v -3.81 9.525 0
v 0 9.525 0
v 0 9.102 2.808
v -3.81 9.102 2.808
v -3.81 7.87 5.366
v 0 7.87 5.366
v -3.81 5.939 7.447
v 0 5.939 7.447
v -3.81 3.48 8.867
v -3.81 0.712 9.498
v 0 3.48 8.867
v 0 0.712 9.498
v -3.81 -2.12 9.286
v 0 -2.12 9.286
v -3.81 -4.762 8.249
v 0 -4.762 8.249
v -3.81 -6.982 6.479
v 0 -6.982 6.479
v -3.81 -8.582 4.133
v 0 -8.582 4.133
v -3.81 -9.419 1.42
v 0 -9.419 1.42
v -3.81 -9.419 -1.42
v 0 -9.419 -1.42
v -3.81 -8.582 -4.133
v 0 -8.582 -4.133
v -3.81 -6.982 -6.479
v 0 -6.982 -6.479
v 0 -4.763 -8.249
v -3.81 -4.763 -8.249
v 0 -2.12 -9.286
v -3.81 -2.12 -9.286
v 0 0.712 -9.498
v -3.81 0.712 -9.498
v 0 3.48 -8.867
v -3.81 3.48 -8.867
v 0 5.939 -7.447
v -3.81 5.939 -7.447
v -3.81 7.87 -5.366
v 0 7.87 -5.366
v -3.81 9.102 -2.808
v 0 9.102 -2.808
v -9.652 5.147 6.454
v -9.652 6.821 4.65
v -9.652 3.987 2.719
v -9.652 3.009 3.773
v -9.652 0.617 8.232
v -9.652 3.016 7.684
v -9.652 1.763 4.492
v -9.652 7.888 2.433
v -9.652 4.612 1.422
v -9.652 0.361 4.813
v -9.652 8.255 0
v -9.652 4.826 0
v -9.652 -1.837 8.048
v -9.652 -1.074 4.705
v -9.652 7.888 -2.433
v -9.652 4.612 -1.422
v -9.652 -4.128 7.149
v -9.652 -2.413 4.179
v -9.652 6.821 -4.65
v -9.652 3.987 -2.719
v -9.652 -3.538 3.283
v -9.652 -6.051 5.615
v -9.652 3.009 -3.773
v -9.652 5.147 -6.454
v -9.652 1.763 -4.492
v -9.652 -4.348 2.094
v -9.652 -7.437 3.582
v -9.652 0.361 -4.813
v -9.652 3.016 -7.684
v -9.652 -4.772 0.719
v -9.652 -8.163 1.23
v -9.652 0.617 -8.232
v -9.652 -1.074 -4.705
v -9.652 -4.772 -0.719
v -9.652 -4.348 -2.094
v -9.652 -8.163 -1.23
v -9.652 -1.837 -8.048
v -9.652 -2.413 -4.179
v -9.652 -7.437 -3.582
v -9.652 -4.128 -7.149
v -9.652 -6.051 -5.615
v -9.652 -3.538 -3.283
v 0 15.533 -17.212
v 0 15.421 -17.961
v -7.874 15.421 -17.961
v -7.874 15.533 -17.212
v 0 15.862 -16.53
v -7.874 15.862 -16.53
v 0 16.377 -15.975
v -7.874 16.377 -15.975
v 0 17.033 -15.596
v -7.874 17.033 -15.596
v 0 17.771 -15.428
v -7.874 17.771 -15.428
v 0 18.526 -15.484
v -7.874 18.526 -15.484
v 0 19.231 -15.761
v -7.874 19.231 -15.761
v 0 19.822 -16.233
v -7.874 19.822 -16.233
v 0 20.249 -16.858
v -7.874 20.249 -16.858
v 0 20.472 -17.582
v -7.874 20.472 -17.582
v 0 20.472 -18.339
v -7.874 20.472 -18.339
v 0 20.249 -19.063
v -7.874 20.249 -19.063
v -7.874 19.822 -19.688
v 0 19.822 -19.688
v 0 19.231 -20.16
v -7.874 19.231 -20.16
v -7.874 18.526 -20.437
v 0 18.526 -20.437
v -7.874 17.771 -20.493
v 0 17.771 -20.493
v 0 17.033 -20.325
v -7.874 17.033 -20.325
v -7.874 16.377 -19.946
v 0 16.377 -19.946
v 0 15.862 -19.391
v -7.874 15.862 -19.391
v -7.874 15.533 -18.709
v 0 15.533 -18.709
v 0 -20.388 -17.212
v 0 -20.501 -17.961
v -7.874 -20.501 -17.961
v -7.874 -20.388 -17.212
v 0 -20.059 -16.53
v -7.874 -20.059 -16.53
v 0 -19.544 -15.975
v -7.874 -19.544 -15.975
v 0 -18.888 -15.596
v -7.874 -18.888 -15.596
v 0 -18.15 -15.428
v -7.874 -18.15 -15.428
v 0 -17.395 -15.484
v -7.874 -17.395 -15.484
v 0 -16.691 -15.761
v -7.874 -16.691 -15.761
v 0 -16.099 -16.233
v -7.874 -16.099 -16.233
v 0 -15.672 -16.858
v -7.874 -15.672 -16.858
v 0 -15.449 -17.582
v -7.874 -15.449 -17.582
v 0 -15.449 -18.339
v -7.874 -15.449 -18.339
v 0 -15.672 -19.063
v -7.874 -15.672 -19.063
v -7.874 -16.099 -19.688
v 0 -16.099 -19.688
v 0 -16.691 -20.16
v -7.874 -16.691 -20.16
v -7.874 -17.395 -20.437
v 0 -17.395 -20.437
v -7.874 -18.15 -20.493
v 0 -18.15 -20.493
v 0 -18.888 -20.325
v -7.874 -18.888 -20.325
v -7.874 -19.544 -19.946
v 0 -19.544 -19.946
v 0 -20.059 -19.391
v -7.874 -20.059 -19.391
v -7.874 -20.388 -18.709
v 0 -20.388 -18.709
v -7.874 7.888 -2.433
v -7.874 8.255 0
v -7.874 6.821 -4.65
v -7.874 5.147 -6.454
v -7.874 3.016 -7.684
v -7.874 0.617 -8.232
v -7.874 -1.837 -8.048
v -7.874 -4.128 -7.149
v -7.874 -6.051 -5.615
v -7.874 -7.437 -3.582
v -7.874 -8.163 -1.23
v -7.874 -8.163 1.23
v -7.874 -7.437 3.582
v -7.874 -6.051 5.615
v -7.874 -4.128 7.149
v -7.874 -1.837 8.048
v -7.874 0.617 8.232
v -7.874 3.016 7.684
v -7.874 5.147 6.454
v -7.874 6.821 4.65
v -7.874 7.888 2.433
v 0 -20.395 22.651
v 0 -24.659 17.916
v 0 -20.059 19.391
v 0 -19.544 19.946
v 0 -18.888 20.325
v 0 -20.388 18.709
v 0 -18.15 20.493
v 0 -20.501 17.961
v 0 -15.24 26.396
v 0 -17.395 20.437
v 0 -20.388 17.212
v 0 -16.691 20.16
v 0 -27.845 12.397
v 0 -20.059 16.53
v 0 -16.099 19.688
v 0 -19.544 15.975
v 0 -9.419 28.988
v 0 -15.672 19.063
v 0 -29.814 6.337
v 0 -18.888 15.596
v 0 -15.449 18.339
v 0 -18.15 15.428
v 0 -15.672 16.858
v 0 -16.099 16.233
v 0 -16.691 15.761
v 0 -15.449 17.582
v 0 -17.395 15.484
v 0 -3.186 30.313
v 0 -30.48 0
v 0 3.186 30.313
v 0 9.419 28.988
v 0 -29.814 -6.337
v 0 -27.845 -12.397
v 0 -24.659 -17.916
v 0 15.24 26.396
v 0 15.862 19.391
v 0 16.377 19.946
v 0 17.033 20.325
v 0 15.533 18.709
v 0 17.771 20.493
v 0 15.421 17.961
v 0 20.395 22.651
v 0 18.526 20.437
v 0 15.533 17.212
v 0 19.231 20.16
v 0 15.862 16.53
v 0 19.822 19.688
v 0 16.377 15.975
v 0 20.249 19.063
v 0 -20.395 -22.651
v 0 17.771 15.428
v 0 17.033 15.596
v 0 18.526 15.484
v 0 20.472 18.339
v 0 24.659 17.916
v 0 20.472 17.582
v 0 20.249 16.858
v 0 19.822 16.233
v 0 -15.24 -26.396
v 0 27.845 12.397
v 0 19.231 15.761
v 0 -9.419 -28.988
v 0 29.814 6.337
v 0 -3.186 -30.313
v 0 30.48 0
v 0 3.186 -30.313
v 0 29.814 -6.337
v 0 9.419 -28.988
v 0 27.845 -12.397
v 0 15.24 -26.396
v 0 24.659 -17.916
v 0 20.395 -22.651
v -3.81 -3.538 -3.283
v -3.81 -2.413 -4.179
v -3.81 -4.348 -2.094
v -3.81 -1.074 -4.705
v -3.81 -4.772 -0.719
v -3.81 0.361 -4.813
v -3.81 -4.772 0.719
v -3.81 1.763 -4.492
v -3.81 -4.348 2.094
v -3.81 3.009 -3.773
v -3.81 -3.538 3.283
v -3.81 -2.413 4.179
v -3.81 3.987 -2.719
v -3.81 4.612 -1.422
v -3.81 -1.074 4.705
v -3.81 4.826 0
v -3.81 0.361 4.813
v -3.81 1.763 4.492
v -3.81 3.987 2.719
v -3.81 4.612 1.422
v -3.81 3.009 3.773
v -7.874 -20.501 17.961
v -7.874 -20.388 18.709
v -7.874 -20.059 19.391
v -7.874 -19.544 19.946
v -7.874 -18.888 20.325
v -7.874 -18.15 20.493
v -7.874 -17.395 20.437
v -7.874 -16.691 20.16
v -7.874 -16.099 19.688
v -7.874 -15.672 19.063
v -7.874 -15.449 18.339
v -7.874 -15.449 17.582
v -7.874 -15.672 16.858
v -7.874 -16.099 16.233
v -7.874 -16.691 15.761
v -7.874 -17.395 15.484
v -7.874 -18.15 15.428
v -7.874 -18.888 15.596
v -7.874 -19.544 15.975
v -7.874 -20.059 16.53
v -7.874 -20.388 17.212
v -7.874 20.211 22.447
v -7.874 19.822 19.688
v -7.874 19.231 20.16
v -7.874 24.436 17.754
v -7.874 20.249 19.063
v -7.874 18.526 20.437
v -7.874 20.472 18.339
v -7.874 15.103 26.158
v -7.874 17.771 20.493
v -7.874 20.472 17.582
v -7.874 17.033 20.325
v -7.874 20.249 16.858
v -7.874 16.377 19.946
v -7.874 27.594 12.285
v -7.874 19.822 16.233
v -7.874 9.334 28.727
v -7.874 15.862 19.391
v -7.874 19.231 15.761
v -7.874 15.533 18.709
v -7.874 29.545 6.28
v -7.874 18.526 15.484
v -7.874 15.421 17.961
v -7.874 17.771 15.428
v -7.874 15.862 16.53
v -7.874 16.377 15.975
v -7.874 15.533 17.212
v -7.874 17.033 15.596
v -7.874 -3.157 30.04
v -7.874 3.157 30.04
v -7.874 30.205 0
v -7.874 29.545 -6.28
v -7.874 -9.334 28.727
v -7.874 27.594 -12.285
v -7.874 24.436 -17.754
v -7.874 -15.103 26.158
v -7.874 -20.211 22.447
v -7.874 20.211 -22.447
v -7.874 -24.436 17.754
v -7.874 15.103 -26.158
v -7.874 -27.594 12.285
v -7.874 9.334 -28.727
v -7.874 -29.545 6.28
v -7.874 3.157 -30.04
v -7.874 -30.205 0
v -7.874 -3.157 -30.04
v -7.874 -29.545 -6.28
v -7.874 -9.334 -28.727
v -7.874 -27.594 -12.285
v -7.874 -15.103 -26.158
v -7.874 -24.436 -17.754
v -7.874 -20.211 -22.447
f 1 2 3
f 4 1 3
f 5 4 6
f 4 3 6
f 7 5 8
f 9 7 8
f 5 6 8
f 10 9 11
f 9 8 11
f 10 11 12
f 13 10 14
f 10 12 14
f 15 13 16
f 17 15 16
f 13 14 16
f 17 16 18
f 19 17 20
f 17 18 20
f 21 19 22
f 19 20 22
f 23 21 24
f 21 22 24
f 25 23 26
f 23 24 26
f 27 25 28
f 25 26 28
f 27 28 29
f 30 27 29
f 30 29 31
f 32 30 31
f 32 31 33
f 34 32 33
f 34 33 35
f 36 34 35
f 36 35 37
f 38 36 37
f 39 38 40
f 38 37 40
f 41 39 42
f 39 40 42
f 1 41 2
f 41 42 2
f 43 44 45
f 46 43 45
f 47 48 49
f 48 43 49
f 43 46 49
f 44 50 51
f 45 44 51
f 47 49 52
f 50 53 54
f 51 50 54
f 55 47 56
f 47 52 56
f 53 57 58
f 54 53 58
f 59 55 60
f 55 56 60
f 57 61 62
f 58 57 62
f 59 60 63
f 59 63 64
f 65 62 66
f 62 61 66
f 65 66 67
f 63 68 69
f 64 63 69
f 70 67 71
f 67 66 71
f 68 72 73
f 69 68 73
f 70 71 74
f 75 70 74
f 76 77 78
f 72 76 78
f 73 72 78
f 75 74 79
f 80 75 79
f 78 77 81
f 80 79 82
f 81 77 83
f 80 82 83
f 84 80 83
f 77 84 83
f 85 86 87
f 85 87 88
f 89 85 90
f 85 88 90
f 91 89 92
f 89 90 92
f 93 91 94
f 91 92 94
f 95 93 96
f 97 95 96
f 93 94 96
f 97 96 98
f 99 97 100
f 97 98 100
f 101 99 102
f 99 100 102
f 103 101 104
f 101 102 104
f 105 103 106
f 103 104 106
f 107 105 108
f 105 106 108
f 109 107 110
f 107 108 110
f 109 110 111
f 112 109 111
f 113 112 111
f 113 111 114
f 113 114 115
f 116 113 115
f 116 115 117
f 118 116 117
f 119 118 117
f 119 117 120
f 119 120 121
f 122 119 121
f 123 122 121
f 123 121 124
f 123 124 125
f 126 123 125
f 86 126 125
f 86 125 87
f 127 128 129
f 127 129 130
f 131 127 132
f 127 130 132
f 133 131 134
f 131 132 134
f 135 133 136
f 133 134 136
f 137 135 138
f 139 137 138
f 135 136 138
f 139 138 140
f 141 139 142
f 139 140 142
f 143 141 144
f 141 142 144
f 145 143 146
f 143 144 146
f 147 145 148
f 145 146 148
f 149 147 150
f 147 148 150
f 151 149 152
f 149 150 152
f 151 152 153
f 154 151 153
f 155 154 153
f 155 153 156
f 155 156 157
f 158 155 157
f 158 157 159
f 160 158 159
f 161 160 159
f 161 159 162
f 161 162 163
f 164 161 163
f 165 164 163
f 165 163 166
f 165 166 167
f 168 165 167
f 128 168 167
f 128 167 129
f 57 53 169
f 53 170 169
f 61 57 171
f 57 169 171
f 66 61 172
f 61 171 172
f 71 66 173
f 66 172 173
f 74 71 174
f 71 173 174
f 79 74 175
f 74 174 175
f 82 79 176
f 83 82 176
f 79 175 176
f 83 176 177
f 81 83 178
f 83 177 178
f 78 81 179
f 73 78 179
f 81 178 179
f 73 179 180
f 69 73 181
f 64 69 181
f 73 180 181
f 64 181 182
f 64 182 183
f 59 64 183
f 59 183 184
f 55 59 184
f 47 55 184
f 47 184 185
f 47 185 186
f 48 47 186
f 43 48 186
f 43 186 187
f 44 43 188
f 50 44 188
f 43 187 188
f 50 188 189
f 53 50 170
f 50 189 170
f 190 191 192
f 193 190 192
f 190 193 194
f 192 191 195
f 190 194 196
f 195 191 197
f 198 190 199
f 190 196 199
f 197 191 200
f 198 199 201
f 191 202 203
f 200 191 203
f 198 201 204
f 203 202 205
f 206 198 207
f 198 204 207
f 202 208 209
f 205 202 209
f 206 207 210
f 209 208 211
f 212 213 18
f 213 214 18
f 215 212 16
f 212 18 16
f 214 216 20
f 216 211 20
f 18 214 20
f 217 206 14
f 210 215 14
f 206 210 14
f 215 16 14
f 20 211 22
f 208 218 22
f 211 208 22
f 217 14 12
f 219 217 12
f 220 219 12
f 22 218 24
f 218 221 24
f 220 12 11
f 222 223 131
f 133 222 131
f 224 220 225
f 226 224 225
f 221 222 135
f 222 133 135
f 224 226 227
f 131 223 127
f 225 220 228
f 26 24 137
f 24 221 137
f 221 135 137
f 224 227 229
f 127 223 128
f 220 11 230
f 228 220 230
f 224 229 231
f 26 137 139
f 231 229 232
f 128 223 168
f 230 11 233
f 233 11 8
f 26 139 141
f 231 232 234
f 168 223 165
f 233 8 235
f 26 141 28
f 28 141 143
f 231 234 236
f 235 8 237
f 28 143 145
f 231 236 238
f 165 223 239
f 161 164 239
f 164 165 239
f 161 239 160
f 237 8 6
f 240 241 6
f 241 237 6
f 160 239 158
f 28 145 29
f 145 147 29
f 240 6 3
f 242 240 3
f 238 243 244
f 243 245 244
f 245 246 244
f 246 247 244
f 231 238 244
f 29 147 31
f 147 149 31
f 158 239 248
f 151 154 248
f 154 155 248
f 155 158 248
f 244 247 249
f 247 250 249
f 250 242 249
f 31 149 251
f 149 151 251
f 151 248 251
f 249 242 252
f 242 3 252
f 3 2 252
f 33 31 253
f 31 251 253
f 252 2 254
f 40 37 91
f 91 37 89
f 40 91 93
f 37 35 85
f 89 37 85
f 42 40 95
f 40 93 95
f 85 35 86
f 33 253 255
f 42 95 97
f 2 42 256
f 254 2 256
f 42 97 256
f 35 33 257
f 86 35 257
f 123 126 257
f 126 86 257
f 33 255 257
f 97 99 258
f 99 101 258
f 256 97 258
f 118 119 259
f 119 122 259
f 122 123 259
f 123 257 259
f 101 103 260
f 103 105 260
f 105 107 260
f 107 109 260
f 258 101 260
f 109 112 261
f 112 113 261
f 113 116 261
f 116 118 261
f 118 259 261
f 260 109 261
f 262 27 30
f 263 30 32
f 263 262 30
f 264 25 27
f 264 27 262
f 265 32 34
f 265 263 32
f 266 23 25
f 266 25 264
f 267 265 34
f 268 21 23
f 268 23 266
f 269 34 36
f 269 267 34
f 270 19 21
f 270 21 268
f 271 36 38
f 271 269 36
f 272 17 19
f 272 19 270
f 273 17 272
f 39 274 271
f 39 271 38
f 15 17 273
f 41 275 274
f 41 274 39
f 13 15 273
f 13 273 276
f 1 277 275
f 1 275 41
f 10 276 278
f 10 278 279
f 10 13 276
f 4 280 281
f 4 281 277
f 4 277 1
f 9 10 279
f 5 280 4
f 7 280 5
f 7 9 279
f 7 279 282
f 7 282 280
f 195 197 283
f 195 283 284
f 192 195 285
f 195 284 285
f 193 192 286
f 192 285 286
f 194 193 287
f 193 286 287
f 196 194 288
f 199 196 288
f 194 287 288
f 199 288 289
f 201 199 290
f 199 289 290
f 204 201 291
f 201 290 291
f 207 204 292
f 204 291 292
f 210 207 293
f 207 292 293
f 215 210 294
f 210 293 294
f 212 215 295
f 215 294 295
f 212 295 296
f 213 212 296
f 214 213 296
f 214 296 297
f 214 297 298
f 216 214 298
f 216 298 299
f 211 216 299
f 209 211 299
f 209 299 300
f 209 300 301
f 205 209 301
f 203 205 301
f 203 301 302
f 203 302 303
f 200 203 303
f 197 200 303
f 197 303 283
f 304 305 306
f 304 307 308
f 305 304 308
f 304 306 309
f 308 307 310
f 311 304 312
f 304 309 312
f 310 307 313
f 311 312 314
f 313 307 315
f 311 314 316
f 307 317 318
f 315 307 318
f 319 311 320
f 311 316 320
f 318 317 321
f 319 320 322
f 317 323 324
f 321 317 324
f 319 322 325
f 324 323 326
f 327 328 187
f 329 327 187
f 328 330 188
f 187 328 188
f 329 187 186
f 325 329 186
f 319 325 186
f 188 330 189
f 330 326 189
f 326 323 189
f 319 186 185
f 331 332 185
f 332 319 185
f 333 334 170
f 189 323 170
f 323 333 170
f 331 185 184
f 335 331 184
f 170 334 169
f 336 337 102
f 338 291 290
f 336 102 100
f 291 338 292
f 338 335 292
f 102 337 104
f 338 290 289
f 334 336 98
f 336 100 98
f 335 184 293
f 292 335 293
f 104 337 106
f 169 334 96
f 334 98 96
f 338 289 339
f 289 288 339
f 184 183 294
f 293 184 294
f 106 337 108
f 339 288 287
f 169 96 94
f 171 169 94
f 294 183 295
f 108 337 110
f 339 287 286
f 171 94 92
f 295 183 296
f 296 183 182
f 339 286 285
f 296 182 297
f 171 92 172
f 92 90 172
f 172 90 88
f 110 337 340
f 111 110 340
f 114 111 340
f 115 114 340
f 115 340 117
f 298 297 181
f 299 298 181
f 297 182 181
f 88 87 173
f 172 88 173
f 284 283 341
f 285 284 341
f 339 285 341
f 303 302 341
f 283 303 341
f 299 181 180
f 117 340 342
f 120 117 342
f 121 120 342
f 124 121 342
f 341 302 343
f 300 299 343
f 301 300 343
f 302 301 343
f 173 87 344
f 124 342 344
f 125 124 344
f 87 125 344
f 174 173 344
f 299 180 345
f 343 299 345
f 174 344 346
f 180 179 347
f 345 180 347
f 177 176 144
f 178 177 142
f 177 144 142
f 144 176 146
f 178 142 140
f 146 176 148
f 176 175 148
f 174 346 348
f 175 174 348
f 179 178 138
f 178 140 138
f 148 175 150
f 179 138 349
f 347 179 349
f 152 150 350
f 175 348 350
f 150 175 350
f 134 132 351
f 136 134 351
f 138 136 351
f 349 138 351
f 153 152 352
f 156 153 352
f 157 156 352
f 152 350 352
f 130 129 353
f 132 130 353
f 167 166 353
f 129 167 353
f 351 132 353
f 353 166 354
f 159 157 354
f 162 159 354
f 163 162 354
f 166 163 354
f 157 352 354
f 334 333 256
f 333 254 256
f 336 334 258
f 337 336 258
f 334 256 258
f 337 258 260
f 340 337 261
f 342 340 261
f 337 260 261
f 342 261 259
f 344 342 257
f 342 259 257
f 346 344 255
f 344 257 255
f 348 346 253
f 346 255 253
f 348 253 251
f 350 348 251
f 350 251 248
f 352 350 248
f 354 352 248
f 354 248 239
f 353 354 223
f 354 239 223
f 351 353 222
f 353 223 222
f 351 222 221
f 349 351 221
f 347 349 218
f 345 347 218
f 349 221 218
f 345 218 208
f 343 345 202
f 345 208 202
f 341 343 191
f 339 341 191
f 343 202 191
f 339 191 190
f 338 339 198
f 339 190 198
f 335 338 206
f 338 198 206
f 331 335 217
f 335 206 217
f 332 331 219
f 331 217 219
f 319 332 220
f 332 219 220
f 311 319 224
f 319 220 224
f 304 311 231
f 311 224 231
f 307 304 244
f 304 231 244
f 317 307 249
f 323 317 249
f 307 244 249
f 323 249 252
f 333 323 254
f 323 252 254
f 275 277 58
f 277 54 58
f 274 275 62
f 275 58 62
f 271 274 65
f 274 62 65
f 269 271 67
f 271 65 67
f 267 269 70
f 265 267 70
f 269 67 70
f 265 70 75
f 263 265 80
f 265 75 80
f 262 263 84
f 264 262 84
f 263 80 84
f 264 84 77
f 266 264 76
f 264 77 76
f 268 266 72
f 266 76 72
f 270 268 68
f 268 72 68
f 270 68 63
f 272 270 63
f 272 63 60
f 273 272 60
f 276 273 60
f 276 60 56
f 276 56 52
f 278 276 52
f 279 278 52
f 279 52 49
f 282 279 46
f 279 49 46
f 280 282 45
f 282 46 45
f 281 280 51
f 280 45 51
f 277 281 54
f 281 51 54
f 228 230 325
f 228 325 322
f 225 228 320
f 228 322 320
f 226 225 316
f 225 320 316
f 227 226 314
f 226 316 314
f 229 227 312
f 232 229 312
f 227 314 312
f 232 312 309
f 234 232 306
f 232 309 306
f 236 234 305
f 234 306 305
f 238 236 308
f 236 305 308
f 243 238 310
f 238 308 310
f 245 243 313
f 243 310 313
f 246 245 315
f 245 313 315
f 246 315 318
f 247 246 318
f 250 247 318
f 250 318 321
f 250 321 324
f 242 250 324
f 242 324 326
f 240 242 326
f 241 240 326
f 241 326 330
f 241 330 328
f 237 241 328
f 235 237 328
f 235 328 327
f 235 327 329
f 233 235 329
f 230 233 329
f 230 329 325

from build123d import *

# Parameters (mm, degrees)
SKETCH2_R          = 2.54
CUT_EXTRUDE1_DEPTH = 44.818496962
SKETCH3_R          = 9.525
CUT_EXTRUDE2_DEPTH = 3.81


with BuildPart() as part:
    # Sketch1 → Revolve1 (revolve)
    with BuildSketch(Plane.XY):
        Polygon((-7.874, 8.255), (-7.874, 30.205033861), (0, 30.48), (0, 4.826), (-9.652, 4.826), (-9.652, 8.255), align=None)
    revolve(axis=Axis((0, 0, 0), (-1, 0, 0)))

    # Sketch2 → Cut-Extrude1 (cut, through all)
    with BuildSketch(Plane.ZY.offset(7.874)):
        with Locations(Location((-17.960512242, 17.960512242, 0), (0, 0, 270))):
            Circle(SKETCH2_R)
        with Locations(Location((17.960512242, 17.960512242, 0), (0, 0, 270))):
            Circle(SKETCH2_R)
        with Locations(Location((17.960512242, -17.960512242, 0), (0, 0, 270))):
            Circle(SKETCH2_R)
        with Locations(Location((-17.960512242, -17.960512242, 0), (0, 0, 270))):
            Circle(SKETCH2_R)
    extrude(amount=-CUT_EXTRUDE1_DEPTH, mode=Mode.SUBTRACT)

    # Sketch3 → Cut-Extrude2 (cut)
    with BuildSketch(Plane(origin=(0, 0, 0), x_dir=(0, 0, -1), z_dir=(1, 0, 0))):
        with Locations(Location((0, 0, 0), (0, 0, 90))):
            Circle(SKETCH3_R)
    extrude(amount=-CUT_EXTRUDE2_DEPTH, mode=Mode.SUBTRACT)


solid = part.part
